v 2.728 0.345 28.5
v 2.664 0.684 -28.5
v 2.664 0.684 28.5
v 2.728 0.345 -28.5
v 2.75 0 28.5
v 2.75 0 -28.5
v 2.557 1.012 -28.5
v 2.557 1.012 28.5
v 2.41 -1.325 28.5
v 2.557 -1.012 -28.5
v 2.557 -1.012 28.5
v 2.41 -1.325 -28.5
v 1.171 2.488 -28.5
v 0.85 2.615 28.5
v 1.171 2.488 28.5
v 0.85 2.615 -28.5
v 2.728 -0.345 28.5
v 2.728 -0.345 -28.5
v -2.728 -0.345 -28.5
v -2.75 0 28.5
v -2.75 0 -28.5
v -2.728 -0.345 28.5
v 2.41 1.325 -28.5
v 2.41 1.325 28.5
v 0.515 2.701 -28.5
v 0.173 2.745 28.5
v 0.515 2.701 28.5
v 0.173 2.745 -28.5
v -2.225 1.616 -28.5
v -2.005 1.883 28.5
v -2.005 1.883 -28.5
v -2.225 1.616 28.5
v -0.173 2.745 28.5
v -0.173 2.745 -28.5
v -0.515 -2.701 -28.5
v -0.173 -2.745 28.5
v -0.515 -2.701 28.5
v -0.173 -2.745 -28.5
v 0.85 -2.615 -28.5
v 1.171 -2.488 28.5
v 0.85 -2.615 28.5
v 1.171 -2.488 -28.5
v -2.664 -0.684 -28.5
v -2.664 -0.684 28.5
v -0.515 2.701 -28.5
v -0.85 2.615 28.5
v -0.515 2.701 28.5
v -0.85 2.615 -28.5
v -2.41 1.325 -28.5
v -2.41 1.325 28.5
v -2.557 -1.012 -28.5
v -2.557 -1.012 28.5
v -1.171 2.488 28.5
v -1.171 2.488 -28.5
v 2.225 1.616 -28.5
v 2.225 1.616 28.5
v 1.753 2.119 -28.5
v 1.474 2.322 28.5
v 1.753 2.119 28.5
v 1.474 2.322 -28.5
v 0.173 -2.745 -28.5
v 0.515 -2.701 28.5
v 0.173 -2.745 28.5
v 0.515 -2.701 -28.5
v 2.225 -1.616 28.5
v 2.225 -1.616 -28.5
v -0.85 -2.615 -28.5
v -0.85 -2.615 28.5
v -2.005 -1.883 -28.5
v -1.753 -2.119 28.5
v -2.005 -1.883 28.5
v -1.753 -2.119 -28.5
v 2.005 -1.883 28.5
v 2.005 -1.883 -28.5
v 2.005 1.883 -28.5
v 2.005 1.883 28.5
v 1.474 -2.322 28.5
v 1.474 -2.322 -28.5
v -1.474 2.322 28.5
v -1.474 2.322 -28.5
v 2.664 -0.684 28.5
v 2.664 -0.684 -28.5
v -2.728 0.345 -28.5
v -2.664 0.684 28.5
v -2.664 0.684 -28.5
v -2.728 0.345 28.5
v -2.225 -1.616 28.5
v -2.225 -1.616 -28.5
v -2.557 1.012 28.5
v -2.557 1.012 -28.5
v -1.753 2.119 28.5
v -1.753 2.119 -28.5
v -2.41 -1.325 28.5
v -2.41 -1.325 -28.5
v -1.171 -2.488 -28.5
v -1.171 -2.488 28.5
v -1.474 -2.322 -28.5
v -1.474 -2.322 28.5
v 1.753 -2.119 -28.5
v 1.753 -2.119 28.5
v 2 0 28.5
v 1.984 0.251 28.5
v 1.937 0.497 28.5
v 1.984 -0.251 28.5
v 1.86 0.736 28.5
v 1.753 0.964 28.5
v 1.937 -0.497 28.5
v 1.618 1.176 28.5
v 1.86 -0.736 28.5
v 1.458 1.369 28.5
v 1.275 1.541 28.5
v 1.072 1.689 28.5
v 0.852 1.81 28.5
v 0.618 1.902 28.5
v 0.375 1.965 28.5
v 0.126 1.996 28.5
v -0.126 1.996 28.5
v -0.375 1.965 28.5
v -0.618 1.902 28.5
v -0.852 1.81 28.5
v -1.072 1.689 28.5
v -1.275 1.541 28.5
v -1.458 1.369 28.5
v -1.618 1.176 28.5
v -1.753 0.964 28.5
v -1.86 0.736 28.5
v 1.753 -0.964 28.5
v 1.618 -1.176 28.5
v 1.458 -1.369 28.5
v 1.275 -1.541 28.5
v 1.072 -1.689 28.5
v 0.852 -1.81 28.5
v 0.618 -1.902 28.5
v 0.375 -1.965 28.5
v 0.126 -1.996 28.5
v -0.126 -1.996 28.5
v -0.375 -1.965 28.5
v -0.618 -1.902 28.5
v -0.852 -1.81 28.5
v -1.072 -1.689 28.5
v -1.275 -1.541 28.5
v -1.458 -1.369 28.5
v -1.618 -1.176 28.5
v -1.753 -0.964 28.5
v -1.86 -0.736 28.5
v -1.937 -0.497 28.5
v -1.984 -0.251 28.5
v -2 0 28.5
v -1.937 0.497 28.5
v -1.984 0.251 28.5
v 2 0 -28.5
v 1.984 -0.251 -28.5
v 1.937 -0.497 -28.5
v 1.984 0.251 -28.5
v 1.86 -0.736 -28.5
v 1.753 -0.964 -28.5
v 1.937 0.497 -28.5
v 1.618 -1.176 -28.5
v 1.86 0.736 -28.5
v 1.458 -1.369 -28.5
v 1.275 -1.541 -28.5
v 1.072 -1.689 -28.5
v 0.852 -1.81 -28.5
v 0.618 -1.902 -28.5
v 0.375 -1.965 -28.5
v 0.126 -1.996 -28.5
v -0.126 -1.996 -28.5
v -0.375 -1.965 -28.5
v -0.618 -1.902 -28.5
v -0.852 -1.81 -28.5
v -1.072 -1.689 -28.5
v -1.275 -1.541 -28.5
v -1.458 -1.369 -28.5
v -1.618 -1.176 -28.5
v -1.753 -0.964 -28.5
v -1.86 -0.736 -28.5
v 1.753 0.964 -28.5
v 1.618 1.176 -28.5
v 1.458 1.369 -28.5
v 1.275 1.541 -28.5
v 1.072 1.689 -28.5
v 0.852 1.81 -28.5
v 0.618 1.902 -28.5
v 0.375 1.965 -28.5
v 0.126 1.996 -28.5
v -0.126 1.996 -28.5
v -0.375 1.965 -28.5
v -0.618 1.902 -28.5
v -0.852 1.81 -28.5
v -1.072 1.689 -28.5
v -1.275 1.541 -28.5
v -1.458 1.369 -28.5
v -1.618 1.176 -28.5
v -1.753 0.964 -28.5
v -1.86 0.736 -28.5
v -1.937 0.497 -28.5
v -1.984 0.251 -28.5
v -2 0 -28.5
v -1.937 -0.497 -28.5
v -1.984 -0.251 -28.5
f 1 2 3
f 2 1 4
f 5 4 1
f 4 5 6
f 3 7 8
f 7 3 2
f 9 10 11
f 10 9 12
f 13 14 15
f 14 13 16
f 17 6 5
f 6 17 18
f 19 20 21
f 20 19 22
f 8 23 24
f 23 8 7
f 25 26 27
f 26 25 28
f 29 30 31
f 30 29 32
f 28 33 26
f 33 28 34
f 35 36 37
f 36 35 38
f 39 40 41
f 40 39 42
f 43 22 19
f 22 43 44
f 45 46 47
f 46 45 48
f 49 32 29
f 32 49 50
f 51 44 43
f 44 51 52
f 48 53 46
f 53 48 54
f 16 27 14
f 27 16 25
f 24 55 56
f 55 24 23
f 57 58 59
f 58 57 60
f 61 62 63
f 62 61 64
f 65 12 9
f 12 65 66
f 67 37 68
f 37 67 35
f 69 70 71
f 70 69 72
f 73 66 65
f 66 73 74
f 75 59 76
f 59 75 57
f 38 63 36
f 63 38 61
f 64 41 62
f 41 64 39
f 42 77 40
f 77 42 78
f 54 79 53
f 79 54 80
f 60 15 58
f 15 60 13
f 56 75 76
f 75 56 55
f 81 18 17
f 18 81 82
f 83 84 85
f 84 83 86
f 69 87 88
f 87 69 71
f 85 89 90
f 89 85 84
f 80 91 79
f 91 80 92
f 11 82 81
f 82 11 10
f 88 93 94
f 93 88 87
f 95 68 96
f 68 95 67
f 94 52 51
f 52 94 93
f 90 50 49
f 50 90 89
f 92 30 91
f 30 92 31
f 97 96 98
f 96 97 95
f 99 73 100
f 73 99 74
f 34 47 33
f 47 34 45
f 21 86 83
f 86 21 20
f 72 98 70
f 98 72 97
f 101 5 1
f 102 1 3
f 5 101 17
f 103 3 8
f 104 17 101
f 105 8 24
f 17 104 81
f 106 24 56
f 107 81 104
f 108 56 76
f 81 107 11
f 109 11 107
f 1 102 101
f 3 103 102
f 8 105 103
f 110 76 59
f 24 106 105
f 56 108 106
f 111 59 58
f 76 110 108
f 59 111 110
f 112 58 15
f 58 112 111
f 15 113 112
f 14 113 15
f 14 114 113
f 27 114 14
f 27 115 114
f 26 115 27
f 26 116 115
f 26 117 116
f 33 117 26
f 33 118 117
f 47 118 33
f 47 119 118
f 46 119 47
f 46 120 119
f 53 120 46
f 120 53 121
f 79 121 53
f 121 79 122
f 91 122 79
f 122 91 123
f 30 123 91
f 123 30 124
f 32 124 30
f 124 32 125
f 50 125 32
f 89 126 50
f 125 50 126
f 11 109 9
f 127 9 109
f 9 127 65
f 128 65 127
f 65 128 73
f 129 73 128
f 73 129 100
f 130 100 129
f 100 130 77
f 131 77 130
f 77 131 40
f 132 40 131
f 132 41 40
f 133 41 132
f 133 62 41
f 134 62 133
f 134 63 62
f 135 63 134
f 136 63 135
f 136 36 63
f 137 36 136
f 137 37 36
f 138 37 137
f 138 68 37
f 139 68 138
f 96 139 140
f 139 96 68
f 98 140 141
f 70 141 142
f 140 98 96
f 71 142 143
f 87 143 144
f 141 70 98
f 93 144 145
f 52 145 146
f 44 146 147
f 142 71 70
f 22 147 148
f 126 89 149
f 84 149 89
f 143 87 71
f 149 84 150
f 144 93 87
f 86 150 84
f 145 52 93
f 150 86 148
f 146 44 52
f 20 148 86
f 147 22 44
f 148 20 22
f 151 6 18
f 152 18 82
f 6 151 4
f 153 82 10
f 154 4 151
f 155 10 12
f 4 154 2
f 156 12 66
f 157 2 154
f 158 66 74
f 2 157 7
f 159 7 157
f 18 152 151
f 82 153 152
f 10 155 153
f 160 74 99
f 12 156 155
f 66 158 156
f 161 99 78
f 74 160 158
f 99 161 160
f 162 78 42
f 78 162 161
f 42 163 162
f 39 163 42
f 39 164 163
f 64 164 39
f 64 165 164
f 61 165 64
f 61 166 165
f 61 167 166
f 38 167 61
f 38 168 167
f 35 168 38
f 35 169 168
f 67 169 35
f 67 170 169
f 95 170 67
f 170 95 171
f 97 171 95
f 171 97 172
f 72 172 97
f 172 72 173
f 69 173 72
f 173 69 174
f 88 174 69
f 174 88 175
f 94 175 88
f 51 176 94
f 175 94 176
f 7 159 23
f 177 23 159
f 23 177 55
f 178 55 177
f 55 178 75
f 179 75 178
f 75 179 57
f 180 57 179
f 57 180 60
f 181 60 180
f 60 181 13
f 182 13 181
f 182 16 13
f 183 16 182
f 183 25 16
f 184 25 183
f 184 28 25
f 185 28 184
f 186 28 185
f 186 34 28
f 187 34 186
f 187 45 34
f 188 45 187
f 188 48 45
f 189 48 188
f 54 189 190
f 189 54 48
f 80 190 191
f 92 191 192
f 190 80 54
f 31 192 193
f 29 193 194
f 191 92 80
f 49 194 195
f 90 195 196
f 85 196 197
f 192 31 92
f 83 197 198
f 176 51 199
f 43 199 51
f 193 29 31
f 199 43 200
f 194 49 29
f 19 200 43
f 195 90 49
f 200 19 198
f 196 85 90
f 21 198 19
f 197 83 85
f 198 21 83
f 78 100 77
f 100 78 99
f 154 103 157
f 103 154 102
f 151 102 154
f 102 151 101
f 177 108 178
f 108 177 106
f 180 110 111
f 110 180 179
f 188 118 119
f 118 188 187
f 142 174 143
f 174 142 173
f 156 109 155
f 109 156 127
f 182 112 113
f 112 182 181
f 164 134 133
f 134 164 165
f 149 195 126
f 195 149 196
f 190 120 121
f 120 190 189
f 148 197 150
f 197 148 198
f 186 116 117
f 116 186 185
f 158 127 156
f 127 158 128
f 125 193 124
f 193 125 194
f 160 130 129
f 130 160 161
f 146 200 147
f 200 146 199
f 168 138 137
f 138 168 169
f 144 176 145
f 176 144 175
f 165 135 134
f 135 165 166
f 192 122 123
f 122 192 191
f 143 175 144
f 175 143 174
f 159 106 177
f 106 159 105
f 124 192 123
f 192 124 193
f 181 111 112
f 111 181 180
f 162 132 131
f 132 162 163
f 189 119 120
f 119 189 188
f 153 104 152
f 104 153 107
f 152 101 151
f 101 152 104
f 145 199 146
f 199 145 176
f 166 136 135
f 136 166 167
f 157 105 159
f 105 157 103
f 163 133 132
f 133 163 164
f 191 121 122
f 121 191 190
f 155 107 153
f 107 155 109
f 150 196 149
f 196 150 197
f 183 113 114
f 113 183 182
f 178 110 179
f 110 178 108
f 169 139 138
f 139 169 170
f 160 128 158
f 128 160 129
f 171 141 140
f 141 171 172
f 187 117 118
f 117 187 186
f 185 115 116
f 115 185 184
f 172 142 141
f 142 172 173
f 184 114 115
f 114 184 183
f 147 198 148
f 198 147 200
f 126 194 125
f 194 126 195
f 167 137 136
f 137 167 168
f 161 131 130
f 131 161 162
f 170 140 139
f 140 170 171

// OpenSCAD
$fn = 50;


difference() {
	union() {
		translate(v = [0, 0, -28.5000000000]) {
			cylinder(h = 57, r = 2.7500000000);
		}
	}
	union() {
		translate(v = [0, 0, -100.0000000000]) {
			cylinder(h = 200, r = 2.0000000000);
		}
	}
}
